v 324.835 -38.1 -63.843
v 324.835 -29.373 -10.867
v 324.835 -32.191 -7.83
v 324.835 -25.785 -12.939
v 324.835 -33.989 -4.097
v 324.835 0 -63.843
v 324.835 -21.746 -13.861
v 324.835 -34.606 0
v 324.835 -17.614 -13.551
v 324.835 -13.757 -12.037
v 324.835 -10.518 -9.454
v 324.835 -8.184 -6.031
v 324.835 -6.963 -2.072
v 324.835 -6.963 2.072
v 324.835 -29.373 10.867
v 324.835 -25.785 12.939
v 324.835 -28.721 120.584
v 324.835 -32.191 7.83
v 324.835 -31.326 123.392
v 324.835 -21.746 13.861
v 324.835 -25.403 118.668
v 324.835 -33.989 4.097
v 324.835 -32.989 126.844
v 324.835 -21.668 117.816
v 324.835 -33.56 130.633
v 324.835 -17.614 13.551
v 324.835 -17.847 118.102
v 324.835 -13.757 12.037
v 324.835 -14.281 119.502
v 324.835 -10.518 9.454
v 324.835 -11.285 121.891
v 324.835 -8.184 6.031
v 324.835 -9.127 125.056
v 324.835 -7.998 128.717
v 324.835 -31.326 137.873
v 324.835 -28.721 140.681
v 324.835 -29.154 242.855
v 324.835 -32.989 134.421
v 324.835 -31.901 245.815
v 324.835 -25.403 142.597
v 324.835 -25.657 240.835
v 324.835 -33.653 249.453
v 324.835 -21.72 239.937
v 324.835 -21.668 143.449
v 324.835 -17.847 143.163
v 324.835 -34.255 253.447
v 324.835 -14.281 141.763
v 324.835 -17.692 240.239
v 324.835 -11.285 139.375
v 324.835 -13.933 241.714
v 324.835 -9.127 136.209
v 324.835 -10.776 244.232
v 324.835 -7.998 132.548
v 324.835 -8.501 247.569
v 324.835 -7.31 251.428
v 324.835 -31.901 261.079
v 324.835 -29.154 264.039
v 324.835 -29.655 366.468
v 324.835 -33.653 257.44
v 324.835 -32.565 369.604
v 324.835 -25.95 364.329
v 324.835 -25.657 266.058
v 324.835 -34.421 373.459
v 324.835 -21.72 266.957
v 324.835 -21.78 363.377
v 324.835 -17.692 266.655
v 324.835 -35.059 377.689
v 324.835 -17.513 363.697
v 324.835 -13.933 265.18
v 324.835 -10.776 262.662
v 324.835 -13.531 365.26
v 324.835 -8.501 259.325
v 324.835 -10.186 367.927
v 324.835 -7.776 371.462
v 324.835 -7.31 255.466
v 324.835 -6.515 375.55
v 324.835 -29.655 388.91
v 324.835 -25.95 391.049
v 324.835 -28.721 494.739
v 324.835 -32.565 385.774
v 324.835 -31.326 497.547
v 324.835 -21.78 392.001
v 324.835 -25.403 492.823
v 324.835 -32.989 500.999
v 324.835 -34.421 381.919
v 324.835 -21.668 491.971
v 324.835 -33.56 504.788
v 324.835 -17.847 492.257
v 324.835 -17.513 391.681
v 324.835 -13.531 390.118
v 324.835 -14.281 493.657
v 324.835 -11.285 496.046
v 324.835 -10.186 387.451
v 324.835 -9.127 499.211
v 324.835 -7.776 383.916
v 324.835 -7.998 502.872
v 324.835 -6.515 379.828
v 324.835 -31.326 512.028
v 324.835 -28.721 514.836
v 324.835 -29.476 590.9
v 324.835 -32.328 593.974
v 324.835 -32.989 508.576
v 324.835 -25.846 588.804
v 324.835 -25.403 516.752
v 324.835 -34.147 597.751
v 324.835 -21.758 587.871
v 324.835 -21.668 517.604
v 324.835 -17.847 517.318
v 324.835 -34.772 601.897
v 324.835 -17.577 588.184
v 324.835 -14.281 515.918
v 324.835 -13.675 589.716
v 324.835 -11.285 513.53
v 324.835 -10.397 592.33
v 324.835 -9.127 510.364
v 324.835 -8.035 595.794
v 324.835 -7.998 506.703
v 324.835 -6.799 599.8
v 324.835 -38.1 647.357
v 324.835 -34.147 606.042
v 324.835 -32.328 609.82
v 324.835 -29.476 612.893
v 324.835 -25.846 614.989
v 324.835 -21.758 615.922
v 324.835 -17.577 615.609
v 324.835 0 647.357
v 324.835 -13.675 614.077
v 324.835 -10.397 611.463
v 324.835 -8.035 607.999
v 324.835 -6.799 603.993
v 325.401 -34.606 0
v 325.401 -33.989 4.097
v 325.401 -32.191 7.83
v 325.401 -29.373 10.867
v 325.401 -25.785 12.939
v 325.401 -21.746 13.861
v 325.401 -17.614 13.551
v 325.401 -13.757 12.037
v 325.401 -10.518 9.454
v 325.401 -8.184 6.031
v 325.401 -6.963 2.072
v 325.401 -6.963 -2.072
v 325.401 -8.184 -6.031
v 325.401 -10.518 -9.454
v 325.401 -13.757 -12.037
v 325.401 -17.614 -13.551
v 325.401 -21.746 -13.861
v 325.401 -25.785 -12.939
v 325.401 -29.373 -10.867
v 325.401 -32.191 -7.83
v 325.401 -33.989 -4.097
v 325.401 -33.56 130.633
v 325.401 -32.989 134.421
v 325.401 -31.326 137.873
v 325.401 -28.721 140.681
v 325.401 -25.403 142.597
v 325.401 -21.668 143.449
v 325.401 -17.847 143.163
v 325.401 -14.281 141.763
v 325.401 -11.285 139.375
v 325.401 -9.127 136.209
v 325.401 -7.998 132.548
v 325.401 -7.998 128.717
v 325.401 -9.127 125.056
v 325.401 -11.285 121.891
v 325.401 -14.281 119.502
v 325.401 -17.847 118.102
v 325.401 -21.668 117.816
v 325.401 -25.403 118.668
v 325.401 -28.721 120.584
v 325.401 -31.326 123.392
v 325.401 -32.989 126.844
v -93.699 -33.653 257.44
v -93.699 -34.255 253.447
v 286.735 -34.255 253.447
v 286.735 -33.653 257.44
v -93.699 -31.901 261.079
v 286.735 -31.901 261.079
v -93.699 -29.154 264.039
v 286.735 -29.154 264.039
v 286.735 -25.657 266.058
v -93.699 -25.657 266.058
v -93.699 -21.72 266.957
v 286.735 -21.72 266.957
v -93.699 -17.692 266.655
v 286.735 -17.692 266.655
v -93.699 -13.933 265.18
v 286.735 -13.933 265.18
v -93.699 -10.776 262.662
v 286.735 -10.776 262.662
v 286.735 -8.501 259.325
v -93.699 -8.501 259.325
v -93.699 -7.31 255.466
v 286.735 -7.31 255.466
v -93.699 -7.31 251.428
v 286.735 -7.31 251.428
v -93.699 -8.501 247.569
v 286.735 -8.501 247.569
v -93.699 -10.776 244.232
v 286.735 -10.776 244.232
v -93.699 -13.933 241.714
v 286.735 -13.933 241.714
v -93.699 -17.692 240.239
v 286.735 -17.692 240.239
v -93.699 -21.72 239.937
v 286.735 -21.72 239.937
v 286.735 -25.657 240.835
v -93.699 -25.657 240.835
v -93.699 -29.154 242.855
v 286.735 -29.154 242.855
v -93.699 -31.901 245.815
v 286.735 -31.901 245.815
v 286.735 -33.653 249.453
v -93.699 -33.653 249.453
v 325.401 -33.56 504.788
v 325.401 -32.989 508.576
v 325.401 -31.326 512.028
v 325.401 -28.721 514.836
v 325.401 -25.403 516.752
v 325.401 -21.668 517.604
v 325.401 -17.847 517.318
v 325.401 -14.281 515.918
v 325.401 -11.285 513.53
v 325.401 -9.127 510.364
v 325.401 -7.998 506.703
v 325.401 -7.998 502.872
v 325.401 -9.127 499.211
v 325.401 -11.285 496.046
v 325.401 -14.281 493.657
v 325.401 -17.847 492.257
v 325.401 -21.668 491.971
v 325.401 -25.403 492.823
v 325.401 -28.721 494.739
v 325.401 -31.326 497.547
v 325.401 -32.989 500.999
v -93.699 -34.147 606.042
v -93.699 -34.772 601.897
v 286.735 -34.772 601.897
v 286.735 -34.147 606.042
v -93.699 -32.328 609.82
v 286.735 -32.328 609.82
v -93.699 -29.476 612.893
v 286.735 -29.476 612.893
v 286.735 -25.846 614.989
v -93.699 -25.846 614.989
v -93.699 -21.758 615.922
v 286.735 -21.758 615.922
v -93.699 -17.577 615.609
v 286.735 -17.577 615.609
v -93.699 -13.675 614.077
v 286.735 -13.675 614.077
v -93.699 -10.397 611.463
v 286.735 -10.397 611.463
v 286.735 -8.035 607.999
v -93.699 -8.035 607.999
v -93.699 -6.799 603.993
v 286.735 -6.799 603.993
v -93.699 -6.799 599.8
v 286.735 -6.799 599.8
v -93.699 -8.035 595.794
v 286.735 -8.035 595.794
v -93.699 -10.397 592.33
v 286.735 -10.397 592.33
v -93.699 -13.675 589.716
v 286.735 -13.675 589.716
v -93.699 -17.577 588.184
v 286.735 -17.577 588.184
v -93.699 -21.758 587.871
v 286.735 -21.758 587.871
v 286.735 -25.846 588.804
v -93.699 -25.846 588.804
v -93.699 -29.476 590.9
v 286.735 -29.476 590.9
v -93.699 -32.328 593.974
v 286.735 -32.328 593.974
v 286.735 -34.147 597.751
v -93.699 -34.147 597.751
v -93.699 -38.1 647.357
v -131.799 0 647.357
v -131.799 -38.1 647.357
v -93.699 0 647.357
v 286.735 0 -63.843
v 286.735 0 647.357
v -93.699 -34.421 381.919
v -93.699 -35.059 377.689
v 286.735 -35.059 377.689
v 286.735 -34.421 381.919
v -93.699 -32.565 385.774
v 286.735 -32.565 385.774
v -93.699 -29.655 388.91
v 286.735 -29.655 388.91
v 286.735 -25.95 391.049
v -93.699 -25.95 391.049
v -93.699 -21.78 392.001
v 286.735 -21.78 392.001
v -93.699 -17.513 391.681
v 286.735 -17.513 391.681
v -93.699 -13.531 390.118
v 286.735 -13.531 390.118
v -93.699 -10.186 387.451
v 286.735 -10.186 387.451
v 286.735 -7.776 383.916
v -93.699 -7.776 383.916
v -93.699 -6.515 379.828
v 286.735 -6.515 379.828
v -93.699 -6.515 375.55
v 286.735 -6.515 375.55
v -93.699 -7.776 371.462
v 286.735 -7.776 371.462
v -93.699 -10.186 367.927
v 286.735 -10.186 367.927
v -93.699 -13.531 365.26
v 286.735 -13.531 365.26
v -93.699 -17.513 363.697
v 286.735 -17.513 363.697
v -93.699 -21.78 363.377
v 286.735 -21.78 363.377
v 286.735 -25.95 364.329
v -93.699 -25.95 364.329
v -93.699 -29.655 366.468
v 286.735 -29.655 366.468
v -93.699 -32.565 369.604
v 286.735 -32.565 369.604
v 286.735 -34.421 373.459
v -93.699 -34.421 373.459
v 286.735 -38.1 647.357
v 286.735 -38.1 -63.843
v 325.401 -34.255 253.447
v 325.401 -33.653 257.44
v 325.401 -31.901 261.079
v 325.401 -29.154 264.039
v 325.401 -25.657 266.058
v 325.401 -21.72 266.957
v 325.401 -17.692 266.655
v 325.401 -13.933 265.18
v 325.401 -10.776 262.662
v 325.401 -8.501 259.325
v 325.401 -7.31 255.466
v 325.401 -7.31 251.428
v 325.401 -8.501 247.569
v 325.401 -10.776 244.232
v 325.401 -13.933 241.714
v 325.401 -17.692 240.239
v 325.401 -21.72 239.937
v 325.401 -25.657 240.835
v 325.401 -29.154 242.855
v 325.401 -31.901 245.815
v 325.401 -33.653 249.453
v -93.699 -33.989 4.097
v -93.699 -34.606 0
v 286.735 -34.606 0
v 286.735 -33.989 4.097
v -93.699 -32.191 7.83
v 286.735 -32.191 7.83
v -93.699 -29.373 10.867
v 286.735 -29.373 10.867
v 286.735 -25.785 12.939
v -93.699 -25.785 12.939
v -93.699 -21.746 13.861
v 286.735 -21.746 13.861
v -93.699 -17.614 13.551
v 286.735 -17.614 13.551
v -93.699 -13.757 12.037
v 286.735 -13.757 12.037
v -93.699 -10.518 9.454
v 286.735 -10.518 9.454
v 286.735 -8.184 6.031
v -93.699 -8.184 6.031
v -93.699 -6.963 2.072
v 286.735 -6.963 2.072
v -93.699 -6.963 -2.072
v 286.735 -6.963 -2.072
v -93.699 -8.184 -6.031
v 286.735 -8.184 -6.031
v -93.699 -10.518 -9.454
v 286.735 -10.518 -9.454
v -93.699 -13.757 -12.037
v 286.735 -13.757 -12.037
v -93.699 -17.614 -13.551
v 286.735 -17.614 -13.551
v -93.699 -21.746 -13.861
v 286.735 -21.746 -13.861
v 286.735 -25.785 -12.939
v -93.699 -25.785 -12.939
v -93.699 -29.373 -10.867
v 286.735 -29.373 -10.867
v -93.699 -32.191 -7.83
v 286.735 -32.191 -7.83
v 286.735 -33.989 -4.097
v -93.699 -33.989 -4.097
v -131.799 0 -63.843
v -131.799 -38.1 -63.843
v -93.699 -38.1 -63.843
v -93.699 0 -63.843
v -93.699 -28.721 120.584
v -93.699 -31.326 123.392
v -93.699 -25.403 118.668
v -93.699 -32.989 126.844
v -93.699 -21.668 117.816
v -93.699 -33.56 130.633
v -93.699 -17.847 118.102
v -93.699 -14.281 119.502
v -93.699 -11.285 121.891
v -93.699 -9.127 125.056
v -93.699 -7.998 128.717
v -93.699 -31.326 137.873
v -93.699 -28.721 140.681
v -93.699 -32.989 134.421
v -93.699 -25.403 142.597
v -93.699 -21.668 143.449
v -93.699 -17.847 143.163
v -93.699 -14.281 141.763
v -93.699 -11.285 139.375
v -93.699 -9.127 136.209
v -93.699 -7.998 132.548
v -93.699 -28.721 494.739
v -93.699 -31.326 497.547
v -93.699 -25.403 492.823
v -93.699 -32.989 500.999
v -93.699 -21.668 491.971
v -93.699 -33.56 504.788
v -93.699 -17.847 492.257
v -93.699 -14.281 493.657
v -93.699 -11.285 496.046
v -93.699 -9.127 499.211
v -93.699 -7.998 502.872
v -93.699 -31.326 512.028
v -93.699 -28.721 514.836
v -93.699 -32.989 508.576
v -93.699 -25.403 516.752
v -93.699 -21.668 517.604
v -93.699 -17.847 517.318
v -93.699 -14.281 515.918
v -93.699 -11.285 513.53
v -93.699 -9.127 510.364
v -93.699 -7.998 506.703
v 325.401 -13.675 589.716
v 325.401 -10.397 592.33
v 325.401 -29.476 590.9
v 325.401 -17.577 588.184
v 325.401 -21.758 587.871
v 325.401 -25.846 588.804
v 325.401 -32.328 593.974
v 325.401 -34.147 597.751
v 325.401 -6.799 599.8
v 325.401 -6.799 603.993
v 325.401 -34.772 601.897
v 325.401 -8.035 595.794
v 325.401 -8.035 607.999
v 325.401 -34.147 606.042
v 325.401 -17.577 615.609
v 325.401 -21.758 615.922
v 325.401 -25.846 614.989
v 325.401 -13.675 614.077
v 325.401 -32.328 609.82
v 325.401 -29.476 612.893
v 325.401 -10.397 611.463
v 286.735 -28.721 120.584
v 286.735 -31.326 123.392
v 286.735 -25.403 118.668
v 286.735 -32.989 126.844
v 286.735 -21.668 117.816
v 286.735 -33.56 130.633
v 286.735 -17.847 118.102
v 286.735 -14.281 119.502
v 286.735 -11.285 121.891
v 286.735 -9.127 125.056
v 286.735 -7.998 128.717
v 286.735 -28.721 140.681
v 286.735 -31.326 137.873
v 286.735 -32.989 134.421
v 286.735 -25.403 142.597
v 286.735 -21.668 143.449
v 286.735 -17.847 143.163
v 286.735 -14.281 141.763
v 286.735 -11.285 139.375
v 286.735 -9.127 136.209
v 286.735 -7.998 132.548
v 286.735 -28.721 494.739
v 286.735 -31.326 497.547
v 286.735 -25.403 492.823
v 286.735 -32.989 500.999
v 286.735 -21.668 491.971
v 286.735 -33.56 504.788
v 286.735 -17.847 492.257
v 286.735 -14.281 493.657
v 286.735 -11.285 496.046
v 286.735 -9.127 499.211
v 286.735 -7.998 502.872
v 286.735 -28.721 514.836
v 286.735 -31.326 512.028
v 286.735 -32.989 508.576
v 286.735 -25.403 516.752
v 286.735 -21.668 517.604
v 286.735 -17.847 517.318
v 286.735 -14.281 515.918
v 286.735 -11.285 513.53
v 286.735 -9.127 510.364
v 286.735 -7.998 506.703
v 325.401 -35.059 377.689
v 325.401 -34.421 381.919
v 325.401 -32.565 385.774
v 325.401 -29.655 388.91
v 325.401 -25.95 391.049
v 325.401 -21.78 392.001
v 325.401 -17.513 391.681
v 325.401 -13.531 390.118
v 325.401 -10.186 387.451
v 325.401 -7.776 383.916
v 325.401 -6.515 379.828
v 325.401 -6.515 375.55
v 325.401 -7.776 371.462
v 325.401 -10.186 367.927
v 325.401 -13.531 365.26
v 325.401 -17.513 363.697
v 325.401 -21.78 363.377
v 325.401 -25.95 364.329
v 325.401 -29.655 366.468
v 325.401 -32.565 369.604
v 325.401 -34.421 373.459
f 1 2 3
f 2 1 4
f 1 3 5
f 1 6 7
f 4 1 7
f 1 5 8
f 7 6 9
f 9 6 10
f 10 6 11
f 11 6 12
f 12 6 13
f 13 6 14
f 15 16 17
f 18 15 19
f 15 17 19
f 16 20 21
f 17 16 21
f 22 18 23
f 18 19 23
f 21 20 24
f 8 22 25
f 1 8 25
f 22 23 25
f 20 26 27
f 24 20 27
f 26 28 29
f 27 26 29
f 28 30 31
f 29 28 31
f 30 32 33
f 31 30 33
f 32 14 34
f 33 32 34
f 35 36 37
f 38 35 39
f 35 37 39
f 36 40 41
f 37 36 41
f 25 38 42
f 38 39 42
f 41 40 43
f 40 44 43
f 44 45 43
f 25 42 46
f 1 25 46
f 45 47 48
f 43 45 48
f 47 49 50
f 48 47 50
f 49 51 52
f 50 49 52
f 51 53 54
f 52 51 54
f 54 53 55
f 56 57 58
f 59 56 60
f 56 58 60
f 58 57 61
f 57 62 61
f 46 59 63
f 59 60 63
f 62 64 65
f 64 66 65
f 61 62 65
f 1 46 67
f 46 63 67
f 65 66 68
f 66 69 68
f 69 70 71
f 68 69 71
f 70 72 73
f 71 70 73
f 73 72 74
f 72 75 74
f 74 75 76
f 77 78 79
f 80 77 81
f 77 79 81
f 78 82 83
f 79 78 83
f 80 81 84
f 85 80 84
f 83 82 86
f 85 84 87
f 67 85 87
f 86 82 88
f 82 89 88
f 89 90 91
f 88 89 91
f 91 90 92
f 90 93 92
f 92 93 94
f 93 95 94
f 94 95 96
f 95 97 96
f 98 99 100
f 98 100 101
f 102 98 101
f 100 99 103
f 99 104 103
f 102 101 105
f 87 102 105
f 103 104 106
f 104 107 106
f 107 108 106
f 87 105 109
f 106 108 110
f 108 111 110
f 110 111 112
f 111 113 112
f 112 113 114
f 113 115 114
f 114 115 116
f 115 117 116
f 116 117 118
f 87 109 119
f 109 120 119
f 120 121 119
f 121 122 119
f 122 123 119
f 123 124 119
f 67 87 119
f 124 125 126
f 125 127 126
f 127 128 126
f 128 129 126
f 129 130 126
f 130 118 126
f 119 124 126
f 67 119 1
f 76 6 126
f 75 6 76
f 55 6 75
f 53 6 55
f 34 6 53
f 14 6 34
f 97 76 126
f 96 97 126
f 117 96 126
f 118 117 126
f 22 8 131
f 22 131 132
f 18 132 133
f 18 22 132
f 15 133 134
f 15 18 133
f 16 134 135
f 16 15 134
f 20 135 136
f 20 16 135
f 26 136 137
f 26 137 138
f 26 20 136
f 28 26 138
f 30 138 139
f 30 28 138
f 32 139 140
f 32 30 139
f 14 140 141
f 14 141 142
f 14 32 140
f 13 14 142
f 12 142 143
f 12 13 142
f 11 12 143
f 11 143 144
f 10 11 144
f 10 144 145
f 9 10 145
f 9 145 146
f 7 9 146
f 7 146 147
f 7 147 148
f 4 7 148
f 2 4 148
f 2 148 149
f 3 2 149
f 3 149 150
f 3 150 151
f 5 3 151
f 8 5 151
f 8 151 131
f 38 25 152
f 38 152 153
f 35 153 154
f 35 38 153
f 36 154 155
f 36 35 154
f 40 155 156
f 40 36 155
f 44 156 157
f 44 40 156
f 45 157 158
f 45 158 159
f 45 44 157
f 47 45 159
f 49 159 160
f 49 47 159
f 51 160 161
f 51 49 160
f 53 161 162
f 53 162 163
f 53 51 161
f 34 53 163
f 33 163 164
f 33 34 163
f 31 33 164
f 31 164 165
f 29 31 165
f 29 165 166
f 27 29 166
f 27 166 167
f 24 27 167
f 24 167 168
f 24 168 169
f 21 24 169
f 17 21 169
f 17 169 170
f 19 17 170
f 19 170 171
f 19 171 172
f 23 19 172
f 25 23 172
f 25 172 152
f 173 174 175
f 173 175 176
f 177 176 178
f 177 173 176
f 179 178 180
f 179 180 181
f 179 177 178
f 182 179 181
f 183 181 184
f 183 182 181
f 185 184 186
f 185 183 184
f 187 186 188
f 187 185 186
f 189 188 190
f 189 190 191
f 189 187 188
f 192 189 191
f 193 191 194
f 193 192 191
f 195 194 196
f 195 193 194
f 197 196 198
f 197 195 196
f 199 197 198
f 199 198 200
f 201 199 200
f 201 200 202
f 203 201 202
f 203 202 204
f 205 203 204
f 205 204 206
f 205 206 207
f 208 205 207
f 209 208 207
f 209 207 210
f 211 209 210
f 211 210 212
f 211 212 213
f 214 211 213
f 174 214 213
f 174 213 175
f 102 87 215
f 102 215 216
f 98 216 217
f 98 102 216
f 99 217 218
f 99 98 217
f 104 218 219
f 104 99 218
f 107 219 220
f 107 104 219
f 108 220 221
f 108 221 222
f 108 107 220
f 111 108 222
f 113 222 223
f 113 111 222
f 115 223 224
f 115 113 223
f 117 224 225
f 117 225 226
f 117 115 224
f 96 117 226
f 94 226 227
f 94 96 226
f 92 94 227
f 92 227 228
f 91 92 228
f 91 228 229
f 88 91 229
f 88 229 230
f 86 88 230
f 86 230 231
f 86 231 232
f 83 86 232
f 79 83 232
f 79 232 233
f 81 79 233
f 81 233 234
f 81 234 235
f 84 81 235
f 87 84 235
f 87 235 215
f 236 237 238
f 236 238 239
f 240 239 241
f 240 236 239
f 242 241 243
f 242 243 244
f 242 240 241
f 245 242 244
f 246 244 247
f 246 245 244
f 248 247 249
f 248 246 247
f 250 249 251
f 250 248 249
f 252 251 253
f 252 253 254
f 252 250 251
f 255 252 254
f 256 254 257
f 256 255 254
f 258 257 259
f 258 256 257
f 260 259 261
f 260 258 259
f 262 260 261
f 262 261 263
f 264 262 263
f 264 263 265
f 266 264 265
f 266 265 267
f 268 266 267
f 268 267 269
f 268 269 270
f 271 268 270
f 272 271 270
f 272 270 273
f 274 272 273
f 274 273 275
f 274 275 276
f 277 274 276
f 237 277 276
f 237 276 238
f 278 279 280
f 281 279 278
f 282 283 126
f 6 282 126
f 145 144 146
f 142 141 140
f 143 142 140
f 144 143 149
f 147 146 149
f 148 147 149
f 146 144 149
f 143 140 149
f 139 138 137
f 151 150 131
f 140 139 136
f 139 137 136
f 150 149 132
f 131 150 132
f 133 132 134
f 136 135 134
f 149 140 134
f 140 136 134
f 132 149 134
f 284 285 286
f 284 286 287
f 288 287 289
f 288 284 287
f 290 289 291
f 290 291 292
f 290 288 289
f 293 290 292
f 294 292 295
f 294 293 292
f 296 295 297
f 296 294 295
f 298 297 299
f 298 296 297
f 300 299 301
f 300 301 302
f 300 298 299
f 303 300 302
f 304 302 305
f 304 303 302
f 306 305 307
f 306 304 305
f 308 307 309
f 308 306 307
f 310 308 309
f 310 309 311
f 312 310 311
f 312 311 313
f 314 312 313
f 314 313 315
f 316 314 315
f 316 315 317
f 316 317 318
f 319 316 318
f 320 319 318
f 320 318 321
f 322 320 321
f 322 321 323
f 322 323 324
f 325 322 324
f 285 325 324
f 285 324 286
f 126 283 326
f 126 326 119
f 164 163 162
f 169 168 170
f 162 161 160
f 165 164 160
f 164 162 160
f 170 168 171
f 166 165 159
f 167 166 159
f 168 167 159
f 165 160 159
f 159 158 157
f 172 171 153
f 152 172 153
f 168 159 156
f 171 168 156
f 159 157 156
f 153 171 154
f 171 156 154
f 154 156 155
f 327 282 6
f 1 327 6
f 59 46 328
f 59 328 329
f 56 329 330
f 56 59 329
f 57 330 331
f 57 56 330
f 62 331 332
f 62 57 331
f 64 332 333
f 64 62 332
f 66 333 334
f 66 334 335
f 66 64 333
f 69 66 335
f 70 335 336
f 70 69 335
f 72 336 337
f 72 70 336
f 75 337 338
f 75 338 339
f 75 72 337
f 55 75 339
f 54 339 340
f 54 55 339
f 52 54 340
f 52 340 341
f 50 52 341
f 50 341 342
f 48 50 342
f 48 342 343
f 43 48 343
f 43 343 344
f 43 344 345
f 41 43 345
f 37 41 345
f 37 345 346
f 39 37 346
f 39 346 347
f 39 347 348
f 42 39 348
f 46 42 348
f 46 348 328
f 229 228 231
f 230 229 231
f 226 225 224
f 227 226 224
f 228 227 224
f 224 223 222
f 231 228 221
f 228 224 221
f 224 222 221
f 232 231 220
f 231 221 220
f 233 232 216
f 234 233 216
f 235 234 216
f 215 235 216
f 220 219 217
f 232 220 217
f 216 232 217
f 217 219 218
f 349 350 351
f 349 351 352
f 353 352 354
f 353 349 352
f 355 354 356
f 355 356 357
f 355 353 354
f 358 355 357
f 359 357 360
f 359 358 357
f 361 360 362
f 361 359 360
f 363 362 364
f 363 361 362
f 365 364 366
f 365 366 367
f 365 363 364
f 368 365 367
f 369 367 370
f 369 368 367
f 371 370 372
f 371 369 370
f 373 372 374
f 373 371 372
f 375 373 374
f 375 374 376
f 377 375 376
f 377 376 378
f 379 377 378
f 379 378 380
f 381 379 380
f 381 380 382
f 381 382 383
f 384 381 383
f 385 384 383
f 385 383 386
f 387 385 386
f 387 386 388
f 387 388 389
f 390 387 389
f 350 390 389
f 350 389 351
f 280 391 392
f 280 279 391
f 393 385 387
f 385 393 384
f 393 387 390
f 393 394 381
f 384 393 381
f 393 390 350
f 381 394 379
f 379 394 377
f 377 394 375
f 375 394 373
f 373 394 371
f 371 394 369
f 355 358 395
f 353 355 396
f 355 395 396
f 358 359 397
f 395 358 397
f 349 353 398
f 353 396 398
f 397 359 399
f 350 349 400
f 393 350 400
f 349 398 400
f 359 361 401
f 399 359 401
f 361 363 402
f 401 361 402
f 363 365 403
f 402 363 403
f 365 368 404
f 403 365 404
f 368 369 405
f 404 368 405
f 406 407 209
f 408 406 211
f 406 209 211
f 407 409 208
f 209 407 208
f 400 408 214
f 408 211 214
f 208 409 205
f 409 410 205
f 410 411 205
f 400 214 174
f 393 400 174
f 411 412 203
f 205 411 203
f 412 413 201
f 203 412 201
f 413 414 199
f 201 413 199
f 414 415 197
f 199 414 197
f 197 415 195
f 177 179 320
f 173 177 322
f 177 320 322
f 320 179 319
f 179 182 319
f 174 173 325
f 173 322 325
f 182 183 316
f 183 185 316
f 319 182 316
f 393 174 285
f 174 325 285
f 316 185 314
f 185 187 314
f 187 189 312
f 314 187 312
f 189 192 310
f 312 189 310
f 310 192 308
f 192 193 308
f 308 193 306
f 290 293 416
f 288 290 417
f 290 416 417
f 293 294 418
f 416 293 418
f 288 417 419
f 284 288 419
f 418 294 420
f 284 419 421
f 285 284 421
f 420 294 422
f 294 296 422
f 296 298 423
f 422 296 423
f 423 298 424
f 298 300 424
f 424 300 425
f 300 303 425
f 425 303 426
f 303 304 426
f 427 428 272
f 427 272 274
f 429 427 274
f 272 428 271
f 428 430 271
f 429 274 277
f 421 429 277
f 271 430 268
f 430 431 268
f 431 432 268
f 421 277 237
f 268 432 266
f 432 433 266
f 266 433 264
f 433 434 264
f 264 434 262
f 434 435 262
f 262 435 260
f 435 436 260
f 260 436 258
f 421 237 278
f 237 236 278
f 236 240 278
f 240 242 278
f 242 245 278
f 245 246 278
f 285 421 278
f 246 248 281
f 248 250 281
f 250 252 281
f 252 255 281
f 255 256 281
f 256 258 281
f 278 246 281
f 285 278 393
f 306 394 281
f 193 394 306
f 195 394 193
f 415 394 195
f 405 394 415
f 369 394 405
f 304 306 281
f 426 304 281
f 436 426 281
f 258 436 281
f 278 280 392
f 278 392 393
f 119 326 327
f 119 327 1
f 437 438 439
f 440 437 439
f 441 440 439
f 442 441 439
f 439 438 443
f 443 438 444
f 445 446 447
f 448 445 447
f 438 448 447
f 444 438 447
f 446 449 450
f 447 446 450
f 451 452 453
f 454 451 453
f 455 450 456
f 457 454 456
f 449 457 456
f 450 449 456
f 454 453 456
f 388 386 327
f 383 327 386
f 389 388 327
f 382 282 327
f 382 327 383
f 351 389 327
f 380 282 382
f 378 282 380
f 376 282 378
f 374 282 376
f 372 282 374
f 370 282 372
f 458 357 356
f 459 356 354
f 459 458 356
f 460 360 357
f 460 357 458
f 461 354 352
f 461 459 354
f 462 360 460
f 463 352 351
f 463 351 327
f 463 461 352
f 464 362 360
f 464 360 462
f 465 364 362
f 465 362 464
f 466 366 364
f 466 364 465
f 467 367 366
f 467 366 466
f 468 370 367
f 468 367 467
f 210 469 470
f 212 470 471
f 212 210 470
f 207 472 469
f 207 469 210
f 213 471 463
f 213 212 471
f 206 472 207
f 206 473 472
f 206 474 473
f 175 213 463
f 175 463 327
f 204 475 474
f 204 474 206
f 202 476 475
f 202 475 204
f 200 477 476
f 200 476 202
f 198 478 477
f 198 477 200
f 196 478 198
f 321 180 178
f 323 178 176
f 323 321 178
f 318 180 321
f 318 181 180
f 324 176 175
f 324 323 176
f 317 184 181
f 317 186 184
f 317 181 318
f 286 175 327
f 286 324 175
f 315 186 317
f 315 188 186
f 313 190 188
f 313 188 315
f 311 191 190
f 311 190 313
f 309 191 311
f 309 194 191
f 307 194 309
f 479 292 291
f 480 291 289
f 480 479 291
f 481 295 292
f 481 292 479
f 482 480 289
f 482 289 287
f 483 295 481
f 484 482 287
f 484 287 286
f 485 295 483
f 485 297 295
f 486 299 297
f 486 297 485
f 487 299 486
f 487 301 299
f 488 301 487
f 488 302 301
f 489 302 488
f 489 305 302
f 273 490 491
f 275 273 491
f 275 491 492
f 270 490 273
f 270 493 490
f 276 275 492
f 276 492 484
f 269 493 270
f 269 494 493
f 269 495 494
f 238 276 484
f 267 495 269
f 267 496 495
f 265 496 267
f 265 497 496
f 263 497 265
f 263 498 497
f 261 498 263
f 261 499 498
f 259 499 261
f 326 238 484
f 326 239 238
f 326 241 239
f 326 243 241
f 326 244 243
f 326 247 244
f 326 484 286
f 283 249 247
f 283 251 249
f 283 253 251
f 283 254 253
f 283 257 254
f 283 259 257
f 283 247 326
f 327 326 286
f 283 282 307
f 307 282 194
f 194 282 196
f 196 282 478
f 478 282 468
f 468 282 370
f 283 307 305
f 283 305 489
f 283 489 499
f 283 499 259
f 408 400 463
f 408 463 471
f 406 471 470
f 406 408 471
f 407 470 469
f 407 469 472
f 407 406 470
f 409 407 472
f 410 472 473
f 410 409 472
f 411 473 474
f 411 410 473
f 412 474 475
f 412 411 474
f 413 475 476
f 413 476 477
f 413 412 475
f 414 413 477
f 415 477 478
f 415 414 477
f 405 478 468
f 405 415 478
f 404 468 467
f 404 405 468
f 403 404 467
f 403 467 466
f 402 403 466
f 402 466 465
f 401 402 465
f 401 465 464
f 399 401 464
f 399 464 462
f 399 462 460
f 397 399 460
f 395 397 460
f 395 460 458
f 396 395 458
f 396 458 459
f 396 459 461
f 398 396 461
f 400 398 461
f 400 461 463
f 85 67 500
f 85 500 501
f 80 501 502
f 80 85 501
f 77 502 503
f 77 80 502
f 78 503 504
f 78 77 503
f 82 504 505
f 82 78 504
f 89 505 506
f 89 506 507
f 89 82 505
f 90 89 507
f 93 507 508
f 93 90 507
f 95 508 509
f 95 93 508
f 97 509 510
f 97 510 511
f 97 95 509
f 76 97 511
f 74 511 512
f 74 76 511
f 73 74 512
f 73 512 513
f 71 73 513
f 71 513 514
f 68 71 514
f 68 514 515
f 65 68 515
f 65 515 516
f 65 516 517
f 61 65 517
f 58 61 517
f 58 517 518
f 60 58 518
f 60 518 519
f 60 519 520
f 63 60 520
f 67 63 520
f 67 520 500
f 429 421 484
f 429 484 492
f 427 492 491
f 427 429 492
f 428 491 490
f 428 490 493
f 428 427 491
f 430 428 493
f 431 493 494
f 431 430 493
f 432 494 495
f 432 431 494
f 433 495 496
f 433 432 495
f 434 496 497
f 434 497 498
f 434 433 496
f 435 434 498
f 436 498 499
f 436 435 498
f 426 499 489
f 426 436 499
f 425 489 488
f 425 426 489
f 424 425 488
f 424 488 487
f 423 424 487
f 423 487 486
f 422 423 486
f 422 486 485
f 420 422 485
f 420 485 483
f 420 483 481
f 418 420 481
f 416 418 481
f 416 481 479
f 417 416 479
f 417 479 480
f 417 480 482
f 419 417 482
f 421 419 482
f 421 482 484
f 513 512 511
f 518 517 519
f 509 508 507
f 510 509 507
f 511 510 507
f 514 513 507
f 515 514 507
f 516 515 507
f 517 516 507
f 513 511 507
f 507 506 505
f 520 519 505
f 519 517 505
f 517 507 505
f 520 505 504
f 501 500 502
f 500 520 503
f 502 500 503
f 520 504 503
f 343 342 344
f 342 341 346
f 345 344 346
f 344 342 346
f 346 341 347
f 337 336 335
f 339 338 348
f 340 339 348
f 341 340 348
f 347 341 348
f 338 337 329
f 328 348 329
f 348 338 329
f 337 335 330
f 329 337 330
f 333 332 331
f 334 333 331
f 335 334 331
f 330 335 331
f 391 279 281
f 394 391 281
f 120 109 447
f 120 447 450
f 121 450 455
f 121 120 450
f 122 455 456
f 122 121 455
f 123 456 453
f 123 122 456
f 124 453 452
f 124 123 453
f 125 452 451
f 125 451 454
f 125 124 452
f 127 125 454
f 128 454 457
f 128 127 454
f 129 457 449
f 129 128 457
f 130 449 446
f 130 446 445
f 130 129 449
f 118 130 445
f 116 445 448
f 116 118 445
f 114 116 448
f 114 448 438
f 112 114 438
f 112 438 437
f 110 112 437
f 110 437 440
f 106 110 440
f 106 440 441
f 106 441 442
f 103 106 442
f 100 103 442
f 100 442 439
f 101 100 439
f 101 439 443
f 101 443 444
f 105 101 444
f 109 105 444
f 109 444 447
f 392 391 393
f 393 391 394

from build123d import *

# Parameters (mm, degrees)
F0_W     = 38.1
F0_H     = 711.2
F1_DEPTH = 38.1
F2_R     = 14.0648438742
F2_R_2   = 12.8526687622
F2_R_3   = 14.3519624693
F2_R_4   = 13.5478861372
F2_R_5   = 12.852653861
F2_R_6   = 13.899417222
F3_DEPTH = 457.2


with BuildPart() as f1:
    # F0 (on Front) → F1 (new body)
    with BuildSketch(Plane.XZ):
        with Locations((-112.7485206842, 291.7568912864)):
            Rectangle(F0_W, F0_H)
    extrude(amount=F1_DEPTH)



with BuildPart() as f1b:
    # F0 (on Front) → F1, piece 2 (new body)
    with BuildSketch(Plane.XZ):
        with Locations((305.7854154587, 291.7568912864)):
            Rectangle(F0_W, F0_H)
    extrude(amount=F1_DEPTH)


with BuildPart() as f1_1:
    add(f1.part)

    add(f1b.part)  # F3 merges F1b
    # F2 (on face) → F3 (join)
    with BuildSketch(Plane(origin=(-131.7985206842, 0, 0), x_dir=(0, -1, 0), z_dir=(-1, 0, 0))):
        with Locations((20.7070652395, 601.8965244293)):
            Circle(F2_R)
        with Locations((20.7070652395, 504.7876238823)):
            Circle(F2_R_2)
        with Locations((20.7070652395, 377.6891231537)):
            Circle(F2_R_3)
        with Locations((20.7070652395, 253.4467875957)):
            Circle(F2_R_4)
        with Locations((20.7070652395, 130.6325346231)):
            Circle(F2_R_5)
        with Locations((20.7070652395, 0)):
            Circle(F2_R_6)
    extrude(amount=-F3_DEPTH)


solid = f1_1.part
